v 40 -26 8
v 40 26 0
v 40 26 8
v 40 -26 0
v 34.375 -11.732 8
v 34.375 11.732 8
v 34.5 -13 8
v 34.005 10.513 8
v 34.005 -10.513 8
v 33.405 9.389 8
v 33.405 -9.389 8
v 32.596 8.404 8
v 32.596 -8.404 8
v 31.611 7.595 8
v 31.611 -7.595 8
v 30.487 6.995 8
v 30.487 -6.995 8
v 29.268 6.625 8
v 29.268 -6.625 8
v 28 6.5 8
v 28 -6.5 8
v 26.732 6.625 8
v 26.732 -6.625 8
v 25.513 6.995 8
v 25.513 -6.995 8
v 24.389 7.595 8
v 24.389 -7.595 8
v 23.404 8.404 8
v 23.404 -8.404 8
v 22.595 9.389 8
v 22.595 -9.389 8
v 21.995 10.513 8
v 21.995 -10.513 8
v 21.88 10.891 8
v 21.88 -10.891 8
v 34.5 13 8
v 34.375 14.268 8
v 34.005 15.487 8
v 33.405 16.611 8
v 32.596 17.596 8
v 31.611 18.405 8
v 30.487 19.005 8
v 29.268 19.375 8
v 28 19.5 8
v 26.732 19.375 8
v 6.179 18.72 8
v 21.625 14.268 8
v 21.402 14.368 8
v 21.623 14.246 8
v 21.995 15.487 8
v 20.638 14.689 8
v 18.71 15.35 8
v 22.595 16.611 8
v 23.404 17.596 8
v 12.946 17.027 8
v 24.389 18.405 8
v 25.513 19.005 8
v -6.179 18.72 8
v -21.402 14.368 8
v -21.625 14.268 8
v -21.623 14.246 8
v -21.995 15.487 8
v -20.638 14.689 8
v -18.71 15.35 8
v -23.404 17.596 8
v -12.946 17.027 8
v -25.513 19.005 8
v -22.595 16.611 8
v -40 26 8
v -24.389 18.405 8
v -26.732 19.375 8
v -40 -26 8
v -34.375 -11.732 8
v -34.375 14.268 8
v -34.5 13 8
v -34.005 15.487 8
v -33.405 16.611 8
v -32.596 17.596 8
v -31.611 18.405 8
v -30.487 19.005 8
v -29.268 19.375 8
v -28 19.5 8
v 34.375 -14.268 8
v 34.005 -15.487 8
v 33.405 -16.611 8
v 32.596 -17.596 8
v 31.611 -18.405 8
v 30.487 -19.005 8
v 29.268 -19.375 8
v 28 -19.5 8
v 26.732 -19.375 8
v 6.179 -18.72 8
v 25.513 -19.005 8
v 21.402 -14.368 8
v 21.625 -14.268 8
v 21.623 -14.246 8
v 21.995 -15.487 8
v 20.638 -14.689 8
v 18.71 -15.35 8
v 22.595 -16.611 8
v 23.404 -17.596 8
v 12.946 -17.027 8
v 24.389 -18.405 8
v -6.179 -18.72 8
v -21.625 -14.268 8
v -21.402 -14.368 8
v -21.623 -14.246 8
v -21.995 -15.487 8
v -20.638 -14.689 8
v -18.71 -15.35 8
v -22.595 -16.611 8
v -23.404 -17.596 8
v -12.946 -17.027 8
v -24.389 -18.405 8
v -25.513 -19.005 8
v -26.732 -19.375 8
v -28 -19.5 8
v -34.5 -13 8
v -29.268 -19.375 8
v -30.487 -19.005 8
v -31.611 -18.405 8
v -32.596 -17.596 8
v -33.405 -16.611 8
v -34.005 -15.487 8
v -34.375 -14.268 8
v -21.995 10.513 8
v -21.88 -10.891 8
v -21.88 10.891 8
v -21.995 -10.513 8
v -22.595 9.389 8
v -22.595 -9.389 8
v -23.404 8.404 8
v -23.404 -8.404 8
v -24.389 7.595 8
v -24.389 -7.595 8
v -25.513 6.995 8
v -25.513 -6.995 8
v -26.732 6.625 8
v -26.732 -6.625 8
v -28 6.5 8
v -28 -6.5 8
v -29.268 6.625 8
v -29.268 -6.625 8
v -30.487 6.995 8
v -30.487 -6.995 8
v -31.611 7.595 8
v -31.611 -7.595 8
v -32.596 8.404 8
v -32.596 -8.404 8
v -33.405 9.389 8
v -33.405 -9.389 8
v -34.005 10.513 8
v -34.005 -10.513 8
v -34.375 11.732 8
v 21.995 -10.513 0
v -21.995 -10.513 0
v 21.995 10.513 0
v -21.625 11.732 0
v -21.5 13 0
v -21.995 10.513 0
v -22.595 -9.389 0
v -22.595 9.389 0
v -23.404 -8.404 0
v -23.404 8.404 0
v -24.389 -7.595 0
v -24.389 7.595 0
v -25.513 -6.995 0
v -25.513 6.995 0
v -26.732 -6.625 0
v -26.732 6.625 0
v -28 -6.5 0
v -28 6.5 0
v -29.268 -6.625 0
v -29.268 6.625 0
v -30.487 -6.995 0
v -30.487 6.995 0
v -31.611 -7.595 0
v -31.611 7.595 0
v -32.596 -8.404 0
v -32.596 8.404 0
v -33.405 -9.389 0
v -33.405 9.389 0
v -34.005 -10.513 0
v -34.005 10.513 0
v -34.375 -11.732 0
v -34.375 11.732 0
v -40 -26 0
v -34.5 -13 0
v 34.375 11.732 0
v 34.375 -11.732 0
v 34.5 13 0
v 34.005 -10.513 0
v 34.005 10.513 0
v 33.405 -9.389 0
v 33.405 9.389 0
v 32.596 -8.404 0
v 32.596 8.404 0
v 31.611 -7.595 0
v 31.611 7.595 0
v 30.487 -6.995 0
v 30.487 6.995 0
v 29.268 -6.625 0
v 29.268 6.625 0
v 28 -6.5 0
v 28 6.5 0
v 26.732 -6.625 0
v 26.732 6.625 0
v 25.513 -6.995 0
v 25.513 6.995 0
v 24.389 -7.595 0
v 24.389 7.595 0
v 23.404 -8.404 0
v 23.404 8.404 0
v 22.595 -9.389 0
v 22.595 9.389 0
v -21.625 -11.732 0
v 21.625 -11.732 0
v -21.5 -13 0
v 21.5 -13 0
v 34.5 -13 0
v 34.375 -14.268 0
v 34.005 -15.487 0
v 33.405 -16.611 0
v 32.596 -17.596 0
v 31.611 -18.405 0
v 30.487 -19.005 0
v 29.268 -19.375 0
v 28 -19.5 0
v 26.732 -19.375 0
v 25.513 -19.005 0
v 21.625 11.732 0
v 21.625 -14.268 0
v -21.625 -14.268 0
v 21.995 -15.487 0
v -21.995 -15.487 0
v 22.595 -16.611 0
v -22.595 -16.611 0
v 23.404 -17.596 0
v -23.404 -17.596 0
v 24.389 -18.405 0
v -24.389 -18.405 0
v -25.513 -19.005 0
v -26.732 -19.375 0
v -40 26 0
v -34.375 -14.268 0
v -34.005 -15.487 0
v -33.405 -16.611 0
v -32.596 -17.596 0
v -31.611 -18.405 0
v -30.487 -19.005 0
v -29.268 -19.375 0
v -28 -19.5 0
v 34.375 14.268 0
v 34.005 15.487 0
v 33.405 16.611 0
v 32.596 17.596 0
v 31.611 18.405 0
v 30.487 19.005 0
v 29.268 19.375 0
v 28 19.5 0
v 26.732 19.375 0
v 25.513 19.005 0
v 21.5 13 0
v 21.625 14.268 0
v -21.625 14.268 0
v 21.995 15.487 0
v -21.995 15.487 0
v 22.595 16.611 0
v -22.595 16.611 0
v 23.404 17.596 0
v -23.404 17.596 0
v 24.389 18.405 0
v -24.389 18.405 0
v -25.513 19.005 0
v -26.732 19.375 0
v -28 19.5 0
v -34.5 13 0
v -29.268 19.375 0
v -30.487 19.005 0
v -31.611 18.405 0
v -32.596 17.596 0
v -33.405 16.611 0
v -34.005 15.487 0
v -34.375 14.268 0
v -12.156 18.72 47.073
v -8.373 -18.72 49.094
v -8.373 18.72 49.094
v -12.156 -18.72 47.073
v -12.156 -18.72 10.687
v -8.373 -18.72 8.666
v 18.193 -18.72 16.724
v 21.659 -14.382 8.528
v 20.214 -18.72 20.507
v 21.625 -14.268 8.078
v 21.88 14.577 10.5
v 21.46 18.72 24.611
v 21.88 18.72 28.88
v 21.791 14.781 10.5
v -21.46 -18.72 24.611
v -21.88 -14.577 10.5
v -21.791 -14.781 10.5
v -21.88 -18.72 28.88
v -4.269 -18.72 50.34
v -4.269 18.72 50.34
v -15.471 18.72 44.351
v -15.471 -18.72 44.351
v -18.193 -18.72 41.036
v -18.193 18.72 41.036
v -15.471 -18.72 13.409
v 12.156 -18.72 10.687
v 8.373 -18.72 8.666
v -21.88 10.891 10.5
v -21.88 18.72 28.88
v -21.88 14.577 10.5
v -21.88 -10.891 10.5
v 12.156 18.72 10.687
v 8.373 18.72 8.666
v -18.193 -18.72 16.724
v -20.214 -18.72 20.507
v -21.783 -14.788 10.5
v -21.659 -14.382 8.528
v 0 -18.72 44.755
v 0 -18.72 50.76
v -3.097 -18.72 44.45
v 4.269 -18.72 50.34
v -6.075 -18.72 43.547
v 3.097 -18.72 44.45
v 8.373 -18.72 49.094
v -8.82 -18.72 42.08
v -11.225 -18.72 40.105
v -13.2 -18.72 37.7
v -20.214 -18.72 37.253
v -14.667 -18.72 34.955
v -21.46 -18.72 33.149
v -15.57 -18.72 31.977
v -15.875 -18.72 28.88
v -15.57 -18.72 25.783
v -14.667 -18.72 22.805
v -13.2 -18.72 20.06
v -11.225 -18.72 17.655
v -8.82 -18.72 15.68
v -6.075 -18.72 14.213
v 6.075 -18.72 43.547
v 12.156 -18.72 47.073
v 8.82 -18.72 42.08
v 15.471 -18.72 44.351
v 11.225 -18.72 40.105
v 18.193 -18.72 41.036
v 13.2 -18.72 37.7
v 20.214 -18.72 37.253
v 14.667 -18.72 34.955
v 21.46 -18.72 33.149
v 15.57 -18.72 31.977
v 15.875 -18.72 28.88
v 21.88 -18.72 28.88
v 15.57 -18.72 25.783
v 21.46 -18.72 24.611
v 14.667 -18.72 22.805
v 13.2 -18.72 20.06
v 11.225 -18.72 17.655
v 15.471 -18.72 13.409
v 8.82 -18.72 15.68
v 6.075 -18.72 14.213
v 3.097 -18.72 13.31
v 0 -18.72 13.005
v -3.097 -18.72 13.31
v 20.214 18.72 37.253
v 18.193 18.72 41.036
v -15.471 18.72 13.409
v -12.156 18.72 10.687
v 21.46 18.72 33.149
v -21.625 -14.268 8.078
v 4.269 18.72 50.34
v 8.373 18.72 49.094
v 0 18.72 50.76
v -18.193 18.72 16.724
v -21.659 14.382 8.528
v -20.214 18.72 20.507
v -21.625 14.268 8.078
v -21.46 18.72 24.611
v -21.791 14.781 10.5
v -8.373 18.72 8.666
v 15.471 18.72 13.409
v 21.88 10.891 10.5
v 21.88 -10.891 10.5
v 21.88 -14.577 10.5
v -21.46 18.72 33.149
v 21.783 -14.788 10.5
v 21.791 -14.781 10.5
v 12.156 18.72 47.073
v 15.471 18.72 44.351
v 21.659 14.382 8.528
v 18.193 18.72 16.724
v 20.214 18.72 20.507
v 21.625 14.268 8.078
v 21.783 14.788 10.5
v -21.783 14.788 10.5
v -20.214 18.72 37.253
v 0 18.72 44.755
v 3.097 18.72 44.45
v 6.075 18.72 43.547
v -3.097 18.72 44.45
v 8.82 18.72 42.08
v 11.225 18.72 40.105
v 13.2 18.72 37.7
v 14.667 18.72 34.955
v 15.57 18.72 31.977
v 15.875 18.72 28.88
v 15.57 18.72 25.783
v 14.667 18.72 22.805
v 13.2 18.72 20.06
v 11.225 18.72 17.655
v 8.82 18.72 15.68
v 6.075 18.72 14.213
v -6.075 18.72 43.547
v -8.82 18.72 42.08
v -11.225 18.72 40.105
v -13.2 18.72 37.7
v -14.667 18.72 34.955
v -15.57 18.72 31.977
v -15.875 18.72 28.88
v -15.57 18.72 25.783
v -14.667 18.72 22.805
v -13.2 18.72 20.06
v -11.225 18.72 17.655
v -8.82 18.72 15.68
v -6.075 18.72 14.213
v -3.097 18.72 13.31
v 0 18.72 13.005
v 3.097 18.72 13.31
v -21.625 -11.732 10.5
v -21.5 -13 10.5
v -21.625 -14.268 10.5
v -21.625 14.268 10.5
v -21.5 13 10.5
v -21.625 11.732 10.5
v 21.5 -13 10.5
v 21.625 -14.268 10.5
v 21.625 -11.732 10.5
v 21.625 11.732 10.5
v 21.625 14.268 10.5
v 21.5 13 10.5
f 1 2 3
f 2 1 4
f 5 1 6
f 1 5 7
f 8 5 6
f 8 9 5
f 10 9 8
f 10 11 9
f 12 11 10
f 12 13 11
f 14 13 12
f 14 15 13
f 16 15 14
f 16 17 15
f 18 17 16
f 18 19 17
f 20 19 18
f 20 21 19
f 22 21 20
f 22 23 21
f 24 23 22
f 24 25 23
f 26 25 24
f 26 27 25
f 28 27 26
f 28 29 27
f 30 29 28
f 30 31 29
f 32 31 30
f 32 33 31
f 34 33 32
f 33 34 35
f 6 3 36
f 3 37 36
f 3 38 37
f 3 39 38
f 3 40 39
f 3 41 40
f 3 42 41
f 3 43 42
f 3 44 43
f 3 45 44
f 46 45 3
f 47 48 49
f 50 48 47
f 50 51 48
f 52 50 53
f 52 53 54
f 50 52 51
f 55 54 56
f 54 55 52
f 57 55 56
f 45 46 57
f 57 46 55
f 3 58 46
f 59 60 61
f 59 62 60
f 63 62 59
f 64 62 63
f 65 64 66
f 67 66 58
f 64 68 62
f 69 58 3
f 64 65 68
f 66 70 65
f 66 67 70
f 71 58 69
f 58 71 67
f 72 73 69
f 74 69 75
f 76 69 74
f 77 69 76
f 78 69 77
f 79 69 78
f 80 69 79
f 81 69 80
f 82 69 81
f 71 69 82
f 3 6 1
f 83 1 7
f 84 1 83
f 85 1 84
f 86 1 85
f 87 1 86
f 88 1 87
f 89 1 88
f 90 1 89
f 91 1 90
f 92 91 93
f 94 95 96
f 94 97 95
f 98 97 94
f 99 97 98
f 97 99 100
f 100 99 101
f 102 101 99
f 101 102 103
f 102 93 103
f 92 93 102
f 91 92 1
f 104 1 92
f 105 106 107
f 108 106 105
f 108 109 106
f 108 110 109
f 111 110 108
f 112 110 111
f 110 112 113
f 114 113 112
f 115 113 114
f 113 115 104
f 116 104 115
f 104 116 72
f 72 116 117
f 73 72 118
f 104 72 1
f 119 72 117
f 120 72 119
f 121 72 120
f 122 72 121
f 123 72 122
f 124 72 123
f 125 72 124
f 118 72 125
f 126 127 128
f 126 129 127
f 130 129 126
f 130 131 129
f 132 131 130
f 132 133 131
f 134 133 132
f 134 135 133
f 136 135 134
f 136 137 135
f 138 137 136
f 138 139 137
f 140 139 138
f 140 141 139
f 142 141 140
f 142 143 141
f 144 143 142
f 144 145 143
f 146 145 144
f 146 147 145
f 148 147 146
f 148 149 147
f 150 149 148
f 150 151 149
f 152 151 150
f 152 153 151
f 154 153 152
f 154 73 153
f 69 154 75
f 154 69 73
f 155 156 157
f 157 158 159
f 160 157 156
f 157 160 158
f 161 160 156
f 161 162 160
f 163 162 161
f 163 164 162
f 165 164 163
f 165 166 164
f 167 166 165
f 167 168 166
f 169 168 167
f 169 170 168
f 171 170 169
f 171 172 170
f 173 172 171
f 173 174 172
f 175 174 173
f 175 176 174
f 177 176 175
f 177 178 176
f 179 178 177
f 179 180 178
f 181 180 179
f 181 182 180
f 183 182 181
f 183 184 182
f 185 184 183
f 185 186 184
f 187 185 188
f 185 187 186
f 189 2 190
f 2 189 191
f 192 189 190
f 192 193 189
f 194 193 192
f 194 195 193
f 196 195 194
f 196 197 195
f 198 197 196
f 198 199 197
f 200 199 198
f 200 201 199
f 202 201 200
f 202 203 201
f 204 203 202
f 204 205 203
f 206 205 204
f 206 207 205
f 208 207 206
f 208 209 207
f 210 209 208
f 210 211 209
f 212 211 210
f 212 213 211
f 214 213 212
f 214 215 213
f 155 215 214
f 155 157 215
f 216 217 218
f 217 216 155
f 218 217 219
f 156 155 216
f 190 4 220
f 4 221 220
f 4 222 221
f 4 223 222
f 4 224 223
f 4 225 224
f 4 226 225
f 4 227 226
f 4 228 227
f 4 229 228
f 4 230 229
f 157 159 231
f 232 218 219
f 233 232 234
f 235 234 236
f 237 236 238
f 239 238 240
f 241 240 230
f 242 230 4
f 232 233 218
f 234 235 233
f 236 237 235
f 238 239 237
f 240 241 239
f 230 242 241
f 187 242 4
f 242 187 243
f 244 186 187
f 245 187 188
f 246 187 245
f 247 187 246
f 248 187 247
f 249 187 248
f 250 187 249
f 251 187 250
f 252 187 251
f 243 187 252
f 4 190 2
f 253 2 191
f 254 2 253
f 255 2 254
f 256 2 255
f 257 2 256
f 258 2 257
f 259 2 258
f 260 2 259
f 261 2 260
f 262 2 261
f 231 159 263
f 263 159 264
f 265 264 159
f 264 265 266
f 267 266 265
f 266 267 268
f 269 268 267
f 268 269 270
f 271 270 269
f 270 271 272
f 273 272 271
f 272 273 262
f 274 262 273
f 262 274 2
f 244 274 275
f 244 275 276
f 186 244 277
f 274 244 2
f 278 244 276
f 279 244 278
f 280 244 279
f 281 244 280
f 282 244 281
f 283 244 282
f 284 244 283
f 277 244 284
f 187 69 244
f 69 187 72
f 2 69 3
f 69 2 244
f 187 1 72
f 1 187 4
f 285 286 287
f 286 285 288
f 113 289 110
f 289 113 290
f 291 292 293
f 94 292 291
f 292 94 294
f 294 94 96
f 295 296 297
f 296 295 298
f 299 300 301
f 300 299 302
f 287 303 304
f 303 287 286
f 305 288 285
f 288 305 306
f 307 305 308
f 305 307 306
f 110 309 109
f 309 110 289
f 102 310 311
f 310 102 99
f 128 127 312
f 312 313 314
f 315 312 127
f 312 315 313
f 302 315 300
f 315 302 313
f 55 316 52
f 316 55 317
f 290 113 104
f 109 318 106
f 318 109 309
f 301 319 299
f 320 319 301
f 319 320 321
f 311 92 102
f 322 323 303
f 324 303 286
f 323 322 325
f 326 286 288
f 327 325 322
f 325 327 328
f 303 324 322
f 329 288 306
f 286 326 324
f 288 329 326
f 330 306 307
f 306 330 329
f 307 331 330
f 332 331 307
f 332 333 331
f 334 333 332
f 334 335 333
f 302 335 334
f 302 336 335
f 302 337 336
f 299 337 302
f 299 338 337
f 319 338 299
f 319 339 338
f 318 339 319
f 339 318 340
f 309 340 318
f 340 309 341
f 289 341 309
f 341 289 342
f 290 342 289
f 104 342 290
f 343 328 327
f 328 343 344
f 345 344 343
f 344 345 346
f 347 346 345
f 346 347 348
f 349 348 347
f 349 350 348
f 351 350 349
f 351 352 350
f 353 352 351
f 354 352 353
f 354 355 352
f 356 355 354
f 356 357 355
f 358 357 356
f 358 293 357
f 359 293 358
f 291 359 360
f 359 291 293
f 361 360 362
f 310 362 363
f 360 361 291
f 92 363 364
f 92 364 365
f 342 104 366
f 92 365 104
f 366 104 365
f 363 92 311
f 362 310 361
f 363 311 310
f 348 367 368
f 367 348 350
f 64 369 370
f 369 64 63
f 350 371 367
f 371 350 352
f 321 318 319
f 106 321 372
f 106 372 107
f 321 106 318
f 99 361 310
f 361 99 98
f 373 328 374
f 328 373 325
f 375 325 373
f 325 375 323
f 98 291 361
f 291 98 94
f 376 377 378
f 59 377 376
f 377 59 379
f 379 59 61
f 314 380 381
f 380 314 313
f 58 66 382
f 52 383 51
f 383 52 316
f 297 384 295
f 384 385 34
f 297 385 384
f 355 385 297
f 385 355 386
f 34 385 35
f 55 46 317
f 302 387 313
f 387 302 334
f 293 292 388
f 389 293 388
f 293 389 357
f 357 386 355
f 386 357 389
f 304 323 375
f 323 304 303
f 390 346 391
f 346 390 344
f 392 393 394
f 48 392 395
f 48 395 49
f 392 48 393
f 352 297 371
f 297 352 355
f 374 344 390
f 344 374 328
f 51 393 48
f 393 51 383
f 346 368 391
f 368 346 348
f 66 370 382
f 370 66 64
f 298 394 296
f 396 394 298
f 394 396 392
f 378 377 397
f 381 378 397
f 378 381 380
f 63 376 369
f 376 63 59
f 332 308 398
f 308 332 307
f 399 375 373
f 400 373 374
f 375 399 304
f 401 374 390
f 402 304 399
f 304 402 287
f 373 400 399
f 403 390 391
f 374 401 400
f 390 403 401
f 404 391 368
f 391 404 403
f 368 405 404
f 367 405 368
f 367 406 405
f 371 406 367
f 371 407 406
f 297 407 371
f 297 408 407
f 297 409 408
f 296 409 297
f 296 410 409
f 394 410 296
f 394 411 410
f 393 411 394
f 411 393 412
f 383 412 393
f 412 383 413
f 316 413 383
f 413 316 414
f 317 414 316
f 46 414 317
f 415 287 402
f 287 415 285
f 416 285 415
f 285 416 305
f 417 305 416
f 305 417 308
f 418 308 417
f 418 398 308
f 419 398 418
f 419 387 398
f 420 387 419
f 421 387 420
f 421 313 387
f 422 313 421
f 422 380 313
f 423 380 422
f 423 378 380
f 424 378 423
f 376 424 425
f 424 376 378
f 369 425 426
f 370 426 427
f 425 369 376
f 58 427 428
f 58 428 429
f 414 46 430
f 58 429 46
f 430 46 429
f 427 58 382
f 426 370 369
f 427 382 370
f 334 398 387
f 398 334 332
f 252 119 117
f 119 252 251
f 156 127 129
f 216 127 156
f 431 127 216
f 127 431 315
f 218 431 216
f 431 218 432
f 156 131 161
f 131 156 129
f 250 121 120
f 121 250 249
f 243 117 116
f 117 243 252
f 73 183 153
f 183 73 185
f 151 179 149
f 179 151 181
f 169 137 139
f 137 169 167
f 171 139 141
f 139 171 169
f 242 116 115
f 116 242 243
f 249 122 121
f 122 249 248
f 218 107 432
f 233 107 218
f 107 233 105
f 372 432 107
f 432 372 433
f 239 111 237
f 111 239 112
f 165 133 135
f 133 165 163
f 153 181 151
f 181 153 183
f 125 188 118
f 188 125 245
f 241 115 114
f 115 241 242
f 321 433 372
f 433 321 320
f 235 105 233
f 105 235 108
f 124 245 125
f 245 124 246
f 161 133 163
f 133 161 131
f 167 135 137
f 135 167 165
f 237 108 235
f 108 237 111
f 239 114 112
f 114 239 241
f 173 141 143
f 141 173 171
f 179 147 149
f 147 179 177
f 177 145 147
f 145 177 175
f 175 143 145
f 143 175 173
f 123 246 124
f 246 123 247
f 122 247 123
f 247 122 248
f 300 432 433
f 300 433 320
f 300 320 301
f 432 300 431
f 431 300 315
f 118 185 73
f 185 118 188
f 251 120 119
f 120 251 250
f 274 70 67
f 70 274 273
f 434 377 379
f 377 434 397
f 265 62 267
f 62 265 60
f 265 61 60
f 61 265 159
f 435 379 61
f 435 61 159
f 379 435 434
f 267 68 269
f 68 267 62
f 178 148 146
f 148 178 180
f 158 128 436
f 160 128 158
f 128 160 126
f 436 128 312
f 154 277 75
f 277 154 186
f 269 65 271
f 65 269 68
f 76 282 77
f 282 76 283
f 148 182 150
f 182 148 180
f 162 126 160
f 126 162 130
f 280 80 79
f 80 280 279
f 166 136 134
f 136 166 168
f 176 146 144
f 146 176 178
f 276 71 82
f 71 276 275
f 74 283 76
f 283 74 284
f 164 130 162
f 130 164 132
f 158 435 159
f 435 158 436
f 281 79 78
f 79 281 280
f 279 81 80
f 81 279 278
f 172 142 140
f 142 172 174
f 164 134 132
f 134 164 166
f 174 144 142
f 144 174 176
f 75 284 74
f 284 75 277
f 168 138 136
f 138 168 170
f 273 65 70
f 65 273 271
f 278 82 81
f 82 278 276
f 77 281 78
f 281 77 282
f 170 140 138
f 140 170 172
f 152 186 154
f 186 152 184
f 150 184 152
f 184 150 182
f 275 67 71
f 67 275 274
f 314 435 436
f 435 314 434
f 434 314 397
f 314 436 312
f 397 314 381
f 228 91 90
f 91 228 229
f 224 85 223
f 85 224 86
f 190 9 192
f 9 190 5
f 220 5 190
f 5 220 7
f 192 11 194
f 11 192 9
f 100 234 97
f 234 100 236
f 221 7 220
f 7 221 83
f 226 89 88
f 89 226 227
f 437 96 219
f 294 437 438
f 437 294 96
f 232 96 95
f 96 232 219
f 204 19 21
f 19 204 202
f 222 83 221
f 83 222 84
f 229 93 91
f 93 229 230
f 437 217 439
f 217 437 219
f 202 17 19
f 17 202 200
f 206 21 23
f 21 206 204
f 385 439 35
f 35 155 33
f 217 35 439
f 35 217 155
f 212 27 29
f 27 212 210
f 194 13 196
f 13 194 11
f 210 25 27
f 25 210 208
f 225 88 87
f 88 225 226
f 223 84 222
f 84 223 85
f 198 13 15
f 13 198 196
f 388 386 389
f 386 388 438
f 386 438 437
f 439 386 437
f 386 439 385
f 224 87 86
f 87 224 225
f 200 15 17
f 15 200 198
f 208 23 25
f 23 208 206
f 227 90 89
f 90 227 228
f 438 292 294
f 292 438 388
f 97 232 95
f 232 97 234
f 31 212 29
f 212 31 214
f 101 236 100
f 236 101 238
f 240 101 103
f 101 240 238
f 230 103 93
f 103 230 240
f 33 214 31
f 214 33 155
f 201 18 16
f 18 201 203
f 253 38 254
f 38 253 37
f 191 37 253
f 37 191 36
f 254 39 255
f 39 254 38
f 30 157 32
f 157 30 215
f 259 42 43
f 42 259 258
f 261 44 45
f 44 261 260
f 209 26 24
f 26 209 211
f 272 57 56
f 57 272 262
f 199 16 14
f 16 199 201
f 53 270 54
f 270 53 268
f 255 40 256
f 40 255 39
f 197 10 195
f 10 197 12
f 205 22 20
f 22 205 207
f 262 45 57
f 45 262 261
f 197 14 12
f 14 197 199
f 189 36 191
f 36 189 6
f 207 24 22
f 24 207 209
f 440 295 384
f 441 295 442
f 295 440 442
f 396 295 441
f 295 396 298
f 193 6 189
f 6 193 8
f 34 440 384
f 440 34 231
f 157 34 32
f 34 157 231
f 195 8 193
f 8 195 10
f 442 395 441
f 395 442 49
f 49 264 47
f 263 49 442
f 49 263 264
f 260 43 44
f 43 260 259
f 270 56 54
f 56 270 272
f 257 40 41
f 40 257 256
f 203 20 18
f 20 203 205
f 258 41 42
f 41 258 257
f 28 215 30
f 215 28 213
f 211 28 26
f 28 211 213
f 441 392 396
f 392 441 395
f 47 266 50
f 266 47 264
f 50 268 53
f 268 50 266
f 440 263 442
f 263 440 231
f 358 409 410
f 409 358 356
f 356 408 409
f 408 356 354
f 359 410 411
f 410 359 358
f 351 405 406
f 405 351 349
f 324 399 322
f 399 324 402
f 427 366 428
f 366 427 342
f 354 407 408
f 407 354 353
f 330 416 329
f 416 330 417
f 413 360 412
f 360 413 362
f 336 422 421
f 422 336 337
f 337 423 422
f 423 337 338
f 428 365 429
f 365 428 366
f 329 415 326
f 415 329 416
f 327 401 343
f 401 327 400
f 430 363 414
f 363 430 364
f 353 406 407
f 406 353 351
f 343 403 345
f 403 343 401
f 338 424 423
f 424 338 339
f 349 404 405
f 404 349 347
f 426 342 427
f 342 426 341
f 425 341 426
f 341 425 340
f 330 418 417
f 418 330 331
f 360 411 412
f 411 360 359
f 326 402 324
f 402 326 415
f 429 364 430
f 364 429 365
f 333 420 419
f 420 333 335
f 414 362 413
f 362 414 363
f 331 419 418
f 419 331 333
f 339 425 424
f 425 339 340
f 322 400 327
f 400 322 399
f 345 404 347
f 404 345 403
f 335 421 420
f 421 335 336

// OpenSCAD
$fn = 32;

// ----------------------------------------------------------------------
// Bearing block: 80 x 52 mm base, 31.75 mm bore at 28.88 mm
// ----------------------------------------------------------------------

// --- parameters (mm) ---
base_w = 80;              // base width
base_d = 52;              // base depth
base_t = 8;               // base thickness
bore_d = 31.75;           // shaft / bearing bore
house_r = 21.88;          // housing outer radius
house_len = 37.44;        // housing length along the shaft
foot_w = 43.76;           // foot width under the housing
foot_len = 27.44;         // foot length along the shaft
axis_z = 28.88;           // bore axis height above the base
holes_d = 13;             // mounting holes
hole_x = 28;              // mounting hole spacing

difference() {
  union() {
    /* base plate with its underside on z = 0 */
    translate([0, 0, base_t / 2]) cube([base_w, base_d, base_t], center = true);
    /* hull foot: a straight web blending into the round housing */
    hull() {
      translate([0, 0, base_t - 0.5]) cube([foot_w, foot_len, 1.6], center = true);
      translate([0, 0, axis_z]) rotate([-90, 0, 0]) cylinder(h = house_len, d = 2 * house_r, center = true);
    }
  }
  /* bore through the housing, 2.5 mm clear on both sides */
  translate([0, 0, axis_z]) rotate([-90, 0, 0]) cylinder(h = house_len + 5, d = bore_d, center = true);
  /* mounting holes through the base plate */
  for (hx = [-28, 28]) {
    for (hy = [-13, 13]) {
      translate([hx, hy, -2.5]) cylinder(h = base_t + 5, d = holes_d);
    }
  }
}
